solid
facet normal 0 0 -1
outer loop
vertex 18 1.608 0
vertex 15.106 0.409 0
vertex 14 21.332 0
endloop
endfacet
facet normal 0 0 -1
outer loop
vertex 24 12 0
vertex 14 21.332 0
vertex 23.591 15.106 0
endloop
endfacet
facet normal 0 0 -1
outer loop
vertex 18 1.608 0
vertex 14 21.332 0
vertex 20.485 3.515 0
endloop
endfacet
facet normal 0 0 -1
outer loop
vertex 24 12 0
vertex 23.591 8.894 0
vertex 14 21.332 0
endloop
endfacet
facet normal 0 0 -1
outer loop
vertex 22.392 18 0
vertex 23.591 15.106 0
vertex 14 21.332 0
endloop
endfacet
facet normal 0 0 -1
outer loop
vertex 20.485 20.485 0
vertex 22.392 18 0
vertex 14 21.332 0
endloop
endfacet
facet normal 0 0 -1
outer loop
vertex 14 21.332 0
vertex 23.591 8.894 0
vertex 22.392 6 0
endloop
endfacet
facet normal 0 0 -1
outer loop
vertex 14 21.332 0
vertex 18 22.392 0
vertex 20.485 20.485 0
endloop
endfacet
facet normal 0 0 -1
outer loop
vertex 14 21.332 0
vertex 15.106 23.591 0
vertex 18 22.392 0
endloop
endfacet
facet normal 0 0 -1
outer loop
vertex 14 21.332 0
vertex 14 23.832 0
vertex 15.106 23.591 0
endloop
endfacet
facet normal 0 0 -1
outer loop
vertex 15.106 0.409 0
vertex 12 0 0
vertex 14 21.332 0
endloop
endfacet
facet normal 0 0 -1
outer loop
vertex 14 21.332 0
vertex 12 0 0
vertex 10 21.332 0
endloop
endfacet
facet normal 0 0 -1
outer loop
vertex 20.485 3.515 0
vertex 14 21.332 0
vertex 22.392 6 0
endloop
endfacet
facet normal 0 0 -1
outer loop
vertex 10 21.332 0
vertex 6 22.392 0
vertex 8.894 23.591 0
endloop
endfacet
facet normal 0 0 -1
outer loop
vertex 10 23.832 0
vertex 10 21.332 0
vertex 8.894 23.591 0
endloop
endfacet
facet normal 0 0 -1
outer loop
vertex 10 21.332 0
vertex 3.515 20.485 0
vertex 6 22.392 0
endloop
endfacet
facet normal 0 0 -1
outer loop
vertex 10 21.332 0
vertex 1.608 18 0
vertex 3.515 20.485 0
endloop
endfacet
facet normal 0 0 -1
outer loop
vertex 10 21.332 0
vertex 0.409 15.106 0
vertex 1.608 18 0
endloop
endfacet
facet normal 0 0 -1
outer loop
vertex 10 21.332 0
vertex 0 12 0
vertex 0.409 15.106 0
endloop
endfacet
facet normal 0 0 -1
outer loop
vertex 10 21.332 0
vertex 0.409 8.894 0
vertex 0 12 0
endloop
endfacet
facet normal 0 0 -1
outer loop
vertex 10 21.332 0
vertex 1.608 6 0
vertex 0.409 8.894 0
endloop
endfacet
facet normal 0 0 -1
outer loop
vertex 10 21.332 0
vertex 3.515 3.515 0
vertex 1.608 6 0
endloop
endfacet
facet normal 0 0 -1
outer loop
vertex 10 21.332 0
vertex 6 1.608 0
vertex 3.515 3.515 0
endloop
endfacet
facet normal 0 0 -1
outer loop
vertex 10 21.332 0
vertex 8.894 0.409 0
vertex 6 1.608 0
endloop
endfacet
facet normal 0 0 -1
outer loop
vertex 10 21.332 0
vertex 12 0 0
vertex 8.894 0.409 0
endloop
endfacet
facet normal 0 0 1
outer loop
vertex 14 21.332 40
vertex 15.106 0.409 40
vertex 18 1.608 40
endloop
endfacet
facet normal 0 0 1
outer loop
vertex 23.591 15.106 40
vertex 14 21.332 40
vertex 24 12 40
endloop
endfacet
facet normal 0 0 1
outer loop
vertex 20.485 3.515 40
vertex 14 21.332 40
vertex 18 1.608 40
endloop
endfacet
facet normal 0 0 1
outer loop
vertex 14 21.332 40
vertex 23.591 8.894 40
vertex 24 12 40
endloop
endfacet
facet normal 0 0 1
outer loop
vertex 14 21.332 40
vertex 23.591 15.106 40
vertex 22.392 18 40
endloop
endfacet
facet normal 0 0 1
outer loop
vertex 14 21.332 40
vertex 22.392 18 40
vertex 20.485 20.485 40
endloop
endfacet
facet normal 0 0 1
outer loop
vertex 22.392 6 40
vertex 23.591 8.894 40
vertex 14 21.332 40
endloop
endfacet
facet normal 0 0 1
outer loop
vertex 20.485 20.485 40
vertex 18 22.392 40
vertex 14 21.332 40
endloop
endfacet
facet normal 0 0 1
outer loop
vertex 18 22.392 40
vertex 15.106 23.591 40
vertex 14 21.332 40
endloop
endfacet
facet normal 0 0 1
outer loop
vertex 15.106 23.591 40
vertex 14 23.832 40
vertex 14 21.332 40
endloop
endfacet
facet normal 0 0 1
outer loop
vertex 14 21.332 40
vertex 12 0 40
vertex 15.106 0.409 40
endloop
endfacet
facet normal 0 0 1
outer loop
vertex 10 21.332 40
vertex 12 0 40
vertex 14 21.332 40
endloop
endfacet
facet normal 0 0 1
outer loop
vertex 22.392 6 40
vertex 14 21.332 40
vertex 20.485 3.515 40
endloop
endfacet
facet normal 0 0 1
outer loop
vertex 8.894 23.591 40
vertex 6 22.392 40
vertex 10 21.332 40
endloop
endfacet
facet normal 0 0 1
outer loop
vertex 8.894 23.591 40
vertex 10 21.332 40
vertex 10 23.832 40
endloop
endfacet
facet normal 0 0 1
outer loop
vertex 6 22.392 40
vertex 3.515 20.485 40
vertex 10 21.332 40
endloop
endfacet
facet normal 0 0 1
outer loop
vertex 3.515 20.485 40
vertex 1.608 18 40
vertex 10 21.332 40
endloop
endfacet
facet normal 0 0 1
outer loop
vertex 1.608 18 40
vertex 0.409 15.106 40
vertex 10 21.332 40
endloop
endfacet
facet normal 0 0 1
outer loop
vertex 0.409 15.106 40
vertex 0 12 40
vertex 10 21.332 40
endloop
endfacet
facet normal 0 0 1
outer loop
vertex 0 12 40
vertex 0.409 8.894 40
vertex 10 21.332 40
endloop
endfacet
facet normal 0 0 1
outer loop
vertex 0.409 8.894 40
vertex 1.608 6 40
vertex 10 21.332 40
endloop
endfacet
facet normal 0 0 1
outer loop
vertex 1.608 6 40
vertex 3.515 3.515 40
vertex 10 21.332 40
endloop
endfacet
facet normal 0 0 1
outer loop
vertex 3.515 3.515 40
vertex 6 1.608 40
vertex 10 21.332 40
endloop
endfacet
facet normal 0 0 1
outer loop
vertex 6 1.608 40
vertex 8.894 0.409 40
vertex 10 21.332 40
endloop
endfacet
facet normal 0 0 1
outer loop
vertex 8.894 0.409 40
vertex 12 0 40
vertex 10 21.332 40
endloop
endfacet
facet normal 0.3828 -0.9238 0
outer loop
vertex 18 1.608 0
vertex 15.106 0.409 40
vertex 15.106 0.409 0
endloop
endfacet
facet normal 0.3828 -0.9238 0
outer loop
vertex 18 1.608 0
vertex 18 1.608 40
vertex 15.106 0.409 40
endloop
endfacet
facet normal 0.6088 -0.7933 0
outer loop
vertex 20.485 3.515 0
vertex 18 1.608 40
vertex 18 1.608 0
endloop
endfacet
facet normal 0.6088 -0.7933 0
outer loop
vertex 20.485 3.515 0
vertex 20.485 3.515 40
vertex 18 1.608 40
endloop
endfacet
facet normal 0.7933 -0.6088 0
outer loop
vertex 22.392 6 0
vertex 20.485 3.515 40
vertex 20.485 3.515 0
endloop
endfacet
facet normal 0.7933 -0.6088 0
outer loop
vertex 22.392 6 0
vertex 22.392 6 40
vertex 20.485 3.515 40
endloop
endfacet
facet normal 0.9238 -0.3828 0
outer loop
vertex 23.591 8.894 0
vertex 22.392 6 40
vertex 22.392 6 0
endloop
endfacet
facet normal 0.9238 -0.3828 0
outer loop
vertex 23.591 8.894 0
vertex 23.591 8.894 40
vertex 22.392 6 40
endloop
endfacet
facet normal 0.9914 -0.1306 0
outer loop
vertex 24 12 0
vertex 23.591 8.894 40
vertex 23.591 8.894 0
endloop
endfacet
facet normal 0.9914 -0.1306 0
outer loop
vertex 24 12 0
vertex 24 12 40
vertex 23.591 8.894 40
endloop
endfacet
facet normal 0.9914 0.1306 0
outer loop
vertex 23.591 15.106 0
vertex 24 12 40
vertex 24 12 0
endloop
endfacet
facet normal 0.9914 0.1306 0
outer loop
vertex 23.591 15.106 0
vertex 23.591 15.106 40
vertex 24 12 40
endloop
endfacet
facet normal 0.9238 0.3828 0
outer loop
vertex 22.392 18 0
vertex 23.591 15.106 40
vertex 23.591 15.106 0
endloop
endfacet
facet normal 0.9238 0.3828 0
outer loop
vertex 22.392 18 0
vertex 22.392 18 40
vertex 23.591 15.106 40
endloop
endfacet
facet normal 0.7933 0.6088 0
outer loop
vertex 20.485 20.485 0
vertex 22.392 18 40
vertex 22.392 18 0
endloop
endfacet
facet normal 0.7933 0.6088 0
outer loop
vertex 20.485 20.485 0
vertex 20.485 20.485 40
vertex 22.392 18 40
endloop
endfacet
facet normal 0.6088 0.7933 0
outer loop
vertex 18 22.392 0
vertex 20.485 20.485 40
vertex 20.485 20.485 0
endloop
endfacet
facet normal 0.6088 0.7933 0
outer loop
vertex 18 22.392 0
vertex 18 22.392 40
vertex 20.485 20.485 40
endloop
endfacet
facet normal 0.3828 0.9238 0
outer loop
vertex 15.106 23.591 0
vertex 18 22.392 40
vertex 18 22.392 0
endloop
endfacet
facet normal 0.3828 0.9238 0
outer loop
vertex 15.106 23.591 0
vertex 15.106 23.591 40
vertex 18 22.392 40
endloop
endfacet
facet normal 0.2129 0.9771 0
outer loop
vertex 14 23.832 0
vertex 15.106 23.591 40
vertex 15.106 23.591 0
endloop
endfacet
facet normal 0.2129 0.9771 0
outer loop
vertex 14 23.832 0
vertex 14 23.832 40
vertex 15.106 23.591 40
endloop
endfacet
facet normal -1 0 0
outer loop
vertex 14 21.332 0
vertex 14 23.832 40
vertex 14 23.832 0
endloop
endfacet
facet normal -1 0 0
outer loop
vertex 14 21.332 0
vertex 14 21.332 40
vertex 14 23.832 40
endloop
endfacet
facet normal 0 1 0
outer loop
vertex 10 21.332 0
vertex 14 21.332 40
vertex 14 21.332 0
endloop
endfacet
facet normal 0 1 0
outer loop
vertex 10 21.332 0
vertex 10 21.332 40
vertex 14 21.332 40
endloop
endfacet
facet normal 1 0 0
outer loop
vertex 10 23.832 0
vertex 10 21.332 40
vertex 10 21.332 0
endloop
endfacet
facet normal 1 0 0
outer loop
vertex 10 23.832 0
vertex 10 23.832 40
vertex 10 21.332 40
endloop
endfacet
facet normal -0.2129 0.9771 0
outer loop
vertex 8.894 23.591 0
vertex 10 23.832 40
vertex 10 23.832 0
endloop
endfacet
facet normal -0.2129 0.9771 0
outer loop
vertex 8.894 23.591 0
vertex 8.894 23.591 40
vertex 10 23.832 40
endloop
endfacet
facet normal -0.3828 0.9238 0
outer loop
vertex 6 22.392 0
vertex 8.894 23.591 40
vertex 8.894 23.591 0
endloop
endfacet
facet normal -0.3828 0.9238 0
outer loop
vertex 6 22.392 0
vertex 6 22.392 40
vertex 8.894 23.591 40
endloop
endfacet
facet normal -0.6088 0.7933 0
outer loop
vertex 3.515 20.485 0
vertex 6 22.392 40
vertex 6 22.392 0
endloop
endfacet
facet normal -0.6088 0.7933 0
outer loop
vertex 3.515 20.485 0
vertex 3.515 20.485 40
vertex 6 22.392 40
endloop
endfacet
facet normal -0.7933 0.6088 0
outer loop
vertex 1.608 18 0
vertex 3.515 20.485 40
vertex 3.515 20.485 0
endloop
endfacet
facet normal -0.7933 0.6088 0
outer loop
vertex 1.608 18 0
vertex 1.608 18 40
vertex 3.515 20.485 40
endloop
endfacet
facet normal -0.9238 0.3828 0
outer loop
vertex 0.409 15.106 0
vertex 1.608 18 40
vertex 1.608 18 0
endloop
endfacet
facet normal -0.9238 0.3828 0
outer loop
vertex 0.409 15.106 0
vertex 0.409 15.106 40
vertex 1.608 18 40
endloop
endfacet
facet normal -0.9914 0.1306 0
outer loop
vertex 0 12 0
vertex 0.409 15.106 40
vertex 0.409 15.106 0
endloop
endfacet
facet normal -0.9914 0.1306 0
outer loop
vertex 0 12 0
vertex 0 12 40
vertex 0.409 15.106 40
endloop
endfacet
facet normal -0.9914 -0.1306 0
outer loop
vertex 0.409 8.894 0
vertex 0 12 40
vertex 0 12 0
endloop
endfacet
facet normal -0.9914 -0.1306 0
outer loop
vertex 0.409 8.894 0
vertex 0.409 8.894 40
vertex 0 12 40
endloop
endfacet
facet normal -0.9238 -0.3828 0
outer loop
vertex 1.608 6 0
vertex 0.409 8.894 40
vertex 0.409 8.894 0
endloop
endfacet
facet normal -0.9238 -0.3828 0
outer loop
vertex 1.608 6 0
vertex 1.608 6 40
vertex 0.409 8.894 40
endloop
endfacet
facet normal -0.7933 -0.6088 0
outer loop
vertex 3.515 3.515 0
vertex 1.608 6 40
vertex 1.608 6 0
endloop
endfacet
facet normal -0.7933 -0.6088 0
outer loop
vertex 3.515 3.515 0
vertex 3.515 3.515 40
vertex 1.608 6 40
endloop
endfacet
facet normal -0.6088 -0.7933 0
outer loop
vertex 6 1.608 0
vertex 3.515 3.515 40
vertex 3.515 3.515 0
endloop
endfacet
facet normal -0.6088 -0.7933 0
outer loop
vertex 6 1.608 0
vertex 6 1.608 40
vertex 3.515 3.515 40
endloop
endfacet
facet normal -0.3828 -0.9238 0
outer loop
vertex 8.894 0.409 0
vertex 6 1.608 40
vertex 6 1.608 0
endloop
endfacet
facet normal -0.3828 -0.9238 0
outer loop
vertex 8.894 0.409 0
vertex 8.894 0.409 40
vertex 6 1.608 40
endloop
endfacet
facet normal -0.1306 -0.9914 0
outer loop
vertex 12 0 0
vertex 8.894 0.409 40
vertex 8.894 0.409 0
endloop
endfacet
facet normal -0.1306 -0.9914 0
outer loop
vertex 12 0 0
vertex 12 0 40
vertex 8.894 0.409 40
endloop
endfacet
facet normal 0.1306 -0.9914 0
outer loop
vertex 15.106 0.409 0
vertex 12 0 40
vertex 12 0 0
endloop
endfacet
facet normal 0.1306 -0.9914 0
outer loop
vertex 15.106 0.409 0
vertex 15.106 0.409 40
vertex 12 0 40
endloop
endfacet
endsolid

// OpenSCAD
$fn = 32;

// ----------------------------------------------------------------------
// Keyway shaft: d24 shaft, key 4 x 2.5 mm
// ----------------------------------------------------------------------

// --- parameters (mm) ---
shaft_r = 12;             // shaft radius
key_w = 4;                // keyway width
key_d = 2.5;              // keyway depth below the surface line
plate_t = 40;             // shaft length, Z (extrusion height)

shaft_d = 2 * shaft_r;  // shaft diameter
circle_step = 15;  // polygon sampling step, degrees

profile = [[8.894, 23.591], [6, 22.392], [3.515, 20.485], [1.608, 18], [0.409, 15.106], [0, 12], [0.409, 8.894], [1.608, 6], [3.515, 3.515], [6, 1.608], [8.894, 0.409], [12, 0], [15.106, 0.409], [18, 1.608], [20.485, 3.515], [22.392, 6], [23.591, 8.894], [24, 12], [23.591, 15.106], [22.392, 18], [20.485, 20.485], [18, 22.392], [15.106, 23.591], [14, 23.832], [14, 21.332], [10, 21.332], [10, 23.832]];  // primary outline, 27 points, counter clockwise

// --- the one profile operation ---
linear_extrude(height = plate_t) polygon(points = profile);
